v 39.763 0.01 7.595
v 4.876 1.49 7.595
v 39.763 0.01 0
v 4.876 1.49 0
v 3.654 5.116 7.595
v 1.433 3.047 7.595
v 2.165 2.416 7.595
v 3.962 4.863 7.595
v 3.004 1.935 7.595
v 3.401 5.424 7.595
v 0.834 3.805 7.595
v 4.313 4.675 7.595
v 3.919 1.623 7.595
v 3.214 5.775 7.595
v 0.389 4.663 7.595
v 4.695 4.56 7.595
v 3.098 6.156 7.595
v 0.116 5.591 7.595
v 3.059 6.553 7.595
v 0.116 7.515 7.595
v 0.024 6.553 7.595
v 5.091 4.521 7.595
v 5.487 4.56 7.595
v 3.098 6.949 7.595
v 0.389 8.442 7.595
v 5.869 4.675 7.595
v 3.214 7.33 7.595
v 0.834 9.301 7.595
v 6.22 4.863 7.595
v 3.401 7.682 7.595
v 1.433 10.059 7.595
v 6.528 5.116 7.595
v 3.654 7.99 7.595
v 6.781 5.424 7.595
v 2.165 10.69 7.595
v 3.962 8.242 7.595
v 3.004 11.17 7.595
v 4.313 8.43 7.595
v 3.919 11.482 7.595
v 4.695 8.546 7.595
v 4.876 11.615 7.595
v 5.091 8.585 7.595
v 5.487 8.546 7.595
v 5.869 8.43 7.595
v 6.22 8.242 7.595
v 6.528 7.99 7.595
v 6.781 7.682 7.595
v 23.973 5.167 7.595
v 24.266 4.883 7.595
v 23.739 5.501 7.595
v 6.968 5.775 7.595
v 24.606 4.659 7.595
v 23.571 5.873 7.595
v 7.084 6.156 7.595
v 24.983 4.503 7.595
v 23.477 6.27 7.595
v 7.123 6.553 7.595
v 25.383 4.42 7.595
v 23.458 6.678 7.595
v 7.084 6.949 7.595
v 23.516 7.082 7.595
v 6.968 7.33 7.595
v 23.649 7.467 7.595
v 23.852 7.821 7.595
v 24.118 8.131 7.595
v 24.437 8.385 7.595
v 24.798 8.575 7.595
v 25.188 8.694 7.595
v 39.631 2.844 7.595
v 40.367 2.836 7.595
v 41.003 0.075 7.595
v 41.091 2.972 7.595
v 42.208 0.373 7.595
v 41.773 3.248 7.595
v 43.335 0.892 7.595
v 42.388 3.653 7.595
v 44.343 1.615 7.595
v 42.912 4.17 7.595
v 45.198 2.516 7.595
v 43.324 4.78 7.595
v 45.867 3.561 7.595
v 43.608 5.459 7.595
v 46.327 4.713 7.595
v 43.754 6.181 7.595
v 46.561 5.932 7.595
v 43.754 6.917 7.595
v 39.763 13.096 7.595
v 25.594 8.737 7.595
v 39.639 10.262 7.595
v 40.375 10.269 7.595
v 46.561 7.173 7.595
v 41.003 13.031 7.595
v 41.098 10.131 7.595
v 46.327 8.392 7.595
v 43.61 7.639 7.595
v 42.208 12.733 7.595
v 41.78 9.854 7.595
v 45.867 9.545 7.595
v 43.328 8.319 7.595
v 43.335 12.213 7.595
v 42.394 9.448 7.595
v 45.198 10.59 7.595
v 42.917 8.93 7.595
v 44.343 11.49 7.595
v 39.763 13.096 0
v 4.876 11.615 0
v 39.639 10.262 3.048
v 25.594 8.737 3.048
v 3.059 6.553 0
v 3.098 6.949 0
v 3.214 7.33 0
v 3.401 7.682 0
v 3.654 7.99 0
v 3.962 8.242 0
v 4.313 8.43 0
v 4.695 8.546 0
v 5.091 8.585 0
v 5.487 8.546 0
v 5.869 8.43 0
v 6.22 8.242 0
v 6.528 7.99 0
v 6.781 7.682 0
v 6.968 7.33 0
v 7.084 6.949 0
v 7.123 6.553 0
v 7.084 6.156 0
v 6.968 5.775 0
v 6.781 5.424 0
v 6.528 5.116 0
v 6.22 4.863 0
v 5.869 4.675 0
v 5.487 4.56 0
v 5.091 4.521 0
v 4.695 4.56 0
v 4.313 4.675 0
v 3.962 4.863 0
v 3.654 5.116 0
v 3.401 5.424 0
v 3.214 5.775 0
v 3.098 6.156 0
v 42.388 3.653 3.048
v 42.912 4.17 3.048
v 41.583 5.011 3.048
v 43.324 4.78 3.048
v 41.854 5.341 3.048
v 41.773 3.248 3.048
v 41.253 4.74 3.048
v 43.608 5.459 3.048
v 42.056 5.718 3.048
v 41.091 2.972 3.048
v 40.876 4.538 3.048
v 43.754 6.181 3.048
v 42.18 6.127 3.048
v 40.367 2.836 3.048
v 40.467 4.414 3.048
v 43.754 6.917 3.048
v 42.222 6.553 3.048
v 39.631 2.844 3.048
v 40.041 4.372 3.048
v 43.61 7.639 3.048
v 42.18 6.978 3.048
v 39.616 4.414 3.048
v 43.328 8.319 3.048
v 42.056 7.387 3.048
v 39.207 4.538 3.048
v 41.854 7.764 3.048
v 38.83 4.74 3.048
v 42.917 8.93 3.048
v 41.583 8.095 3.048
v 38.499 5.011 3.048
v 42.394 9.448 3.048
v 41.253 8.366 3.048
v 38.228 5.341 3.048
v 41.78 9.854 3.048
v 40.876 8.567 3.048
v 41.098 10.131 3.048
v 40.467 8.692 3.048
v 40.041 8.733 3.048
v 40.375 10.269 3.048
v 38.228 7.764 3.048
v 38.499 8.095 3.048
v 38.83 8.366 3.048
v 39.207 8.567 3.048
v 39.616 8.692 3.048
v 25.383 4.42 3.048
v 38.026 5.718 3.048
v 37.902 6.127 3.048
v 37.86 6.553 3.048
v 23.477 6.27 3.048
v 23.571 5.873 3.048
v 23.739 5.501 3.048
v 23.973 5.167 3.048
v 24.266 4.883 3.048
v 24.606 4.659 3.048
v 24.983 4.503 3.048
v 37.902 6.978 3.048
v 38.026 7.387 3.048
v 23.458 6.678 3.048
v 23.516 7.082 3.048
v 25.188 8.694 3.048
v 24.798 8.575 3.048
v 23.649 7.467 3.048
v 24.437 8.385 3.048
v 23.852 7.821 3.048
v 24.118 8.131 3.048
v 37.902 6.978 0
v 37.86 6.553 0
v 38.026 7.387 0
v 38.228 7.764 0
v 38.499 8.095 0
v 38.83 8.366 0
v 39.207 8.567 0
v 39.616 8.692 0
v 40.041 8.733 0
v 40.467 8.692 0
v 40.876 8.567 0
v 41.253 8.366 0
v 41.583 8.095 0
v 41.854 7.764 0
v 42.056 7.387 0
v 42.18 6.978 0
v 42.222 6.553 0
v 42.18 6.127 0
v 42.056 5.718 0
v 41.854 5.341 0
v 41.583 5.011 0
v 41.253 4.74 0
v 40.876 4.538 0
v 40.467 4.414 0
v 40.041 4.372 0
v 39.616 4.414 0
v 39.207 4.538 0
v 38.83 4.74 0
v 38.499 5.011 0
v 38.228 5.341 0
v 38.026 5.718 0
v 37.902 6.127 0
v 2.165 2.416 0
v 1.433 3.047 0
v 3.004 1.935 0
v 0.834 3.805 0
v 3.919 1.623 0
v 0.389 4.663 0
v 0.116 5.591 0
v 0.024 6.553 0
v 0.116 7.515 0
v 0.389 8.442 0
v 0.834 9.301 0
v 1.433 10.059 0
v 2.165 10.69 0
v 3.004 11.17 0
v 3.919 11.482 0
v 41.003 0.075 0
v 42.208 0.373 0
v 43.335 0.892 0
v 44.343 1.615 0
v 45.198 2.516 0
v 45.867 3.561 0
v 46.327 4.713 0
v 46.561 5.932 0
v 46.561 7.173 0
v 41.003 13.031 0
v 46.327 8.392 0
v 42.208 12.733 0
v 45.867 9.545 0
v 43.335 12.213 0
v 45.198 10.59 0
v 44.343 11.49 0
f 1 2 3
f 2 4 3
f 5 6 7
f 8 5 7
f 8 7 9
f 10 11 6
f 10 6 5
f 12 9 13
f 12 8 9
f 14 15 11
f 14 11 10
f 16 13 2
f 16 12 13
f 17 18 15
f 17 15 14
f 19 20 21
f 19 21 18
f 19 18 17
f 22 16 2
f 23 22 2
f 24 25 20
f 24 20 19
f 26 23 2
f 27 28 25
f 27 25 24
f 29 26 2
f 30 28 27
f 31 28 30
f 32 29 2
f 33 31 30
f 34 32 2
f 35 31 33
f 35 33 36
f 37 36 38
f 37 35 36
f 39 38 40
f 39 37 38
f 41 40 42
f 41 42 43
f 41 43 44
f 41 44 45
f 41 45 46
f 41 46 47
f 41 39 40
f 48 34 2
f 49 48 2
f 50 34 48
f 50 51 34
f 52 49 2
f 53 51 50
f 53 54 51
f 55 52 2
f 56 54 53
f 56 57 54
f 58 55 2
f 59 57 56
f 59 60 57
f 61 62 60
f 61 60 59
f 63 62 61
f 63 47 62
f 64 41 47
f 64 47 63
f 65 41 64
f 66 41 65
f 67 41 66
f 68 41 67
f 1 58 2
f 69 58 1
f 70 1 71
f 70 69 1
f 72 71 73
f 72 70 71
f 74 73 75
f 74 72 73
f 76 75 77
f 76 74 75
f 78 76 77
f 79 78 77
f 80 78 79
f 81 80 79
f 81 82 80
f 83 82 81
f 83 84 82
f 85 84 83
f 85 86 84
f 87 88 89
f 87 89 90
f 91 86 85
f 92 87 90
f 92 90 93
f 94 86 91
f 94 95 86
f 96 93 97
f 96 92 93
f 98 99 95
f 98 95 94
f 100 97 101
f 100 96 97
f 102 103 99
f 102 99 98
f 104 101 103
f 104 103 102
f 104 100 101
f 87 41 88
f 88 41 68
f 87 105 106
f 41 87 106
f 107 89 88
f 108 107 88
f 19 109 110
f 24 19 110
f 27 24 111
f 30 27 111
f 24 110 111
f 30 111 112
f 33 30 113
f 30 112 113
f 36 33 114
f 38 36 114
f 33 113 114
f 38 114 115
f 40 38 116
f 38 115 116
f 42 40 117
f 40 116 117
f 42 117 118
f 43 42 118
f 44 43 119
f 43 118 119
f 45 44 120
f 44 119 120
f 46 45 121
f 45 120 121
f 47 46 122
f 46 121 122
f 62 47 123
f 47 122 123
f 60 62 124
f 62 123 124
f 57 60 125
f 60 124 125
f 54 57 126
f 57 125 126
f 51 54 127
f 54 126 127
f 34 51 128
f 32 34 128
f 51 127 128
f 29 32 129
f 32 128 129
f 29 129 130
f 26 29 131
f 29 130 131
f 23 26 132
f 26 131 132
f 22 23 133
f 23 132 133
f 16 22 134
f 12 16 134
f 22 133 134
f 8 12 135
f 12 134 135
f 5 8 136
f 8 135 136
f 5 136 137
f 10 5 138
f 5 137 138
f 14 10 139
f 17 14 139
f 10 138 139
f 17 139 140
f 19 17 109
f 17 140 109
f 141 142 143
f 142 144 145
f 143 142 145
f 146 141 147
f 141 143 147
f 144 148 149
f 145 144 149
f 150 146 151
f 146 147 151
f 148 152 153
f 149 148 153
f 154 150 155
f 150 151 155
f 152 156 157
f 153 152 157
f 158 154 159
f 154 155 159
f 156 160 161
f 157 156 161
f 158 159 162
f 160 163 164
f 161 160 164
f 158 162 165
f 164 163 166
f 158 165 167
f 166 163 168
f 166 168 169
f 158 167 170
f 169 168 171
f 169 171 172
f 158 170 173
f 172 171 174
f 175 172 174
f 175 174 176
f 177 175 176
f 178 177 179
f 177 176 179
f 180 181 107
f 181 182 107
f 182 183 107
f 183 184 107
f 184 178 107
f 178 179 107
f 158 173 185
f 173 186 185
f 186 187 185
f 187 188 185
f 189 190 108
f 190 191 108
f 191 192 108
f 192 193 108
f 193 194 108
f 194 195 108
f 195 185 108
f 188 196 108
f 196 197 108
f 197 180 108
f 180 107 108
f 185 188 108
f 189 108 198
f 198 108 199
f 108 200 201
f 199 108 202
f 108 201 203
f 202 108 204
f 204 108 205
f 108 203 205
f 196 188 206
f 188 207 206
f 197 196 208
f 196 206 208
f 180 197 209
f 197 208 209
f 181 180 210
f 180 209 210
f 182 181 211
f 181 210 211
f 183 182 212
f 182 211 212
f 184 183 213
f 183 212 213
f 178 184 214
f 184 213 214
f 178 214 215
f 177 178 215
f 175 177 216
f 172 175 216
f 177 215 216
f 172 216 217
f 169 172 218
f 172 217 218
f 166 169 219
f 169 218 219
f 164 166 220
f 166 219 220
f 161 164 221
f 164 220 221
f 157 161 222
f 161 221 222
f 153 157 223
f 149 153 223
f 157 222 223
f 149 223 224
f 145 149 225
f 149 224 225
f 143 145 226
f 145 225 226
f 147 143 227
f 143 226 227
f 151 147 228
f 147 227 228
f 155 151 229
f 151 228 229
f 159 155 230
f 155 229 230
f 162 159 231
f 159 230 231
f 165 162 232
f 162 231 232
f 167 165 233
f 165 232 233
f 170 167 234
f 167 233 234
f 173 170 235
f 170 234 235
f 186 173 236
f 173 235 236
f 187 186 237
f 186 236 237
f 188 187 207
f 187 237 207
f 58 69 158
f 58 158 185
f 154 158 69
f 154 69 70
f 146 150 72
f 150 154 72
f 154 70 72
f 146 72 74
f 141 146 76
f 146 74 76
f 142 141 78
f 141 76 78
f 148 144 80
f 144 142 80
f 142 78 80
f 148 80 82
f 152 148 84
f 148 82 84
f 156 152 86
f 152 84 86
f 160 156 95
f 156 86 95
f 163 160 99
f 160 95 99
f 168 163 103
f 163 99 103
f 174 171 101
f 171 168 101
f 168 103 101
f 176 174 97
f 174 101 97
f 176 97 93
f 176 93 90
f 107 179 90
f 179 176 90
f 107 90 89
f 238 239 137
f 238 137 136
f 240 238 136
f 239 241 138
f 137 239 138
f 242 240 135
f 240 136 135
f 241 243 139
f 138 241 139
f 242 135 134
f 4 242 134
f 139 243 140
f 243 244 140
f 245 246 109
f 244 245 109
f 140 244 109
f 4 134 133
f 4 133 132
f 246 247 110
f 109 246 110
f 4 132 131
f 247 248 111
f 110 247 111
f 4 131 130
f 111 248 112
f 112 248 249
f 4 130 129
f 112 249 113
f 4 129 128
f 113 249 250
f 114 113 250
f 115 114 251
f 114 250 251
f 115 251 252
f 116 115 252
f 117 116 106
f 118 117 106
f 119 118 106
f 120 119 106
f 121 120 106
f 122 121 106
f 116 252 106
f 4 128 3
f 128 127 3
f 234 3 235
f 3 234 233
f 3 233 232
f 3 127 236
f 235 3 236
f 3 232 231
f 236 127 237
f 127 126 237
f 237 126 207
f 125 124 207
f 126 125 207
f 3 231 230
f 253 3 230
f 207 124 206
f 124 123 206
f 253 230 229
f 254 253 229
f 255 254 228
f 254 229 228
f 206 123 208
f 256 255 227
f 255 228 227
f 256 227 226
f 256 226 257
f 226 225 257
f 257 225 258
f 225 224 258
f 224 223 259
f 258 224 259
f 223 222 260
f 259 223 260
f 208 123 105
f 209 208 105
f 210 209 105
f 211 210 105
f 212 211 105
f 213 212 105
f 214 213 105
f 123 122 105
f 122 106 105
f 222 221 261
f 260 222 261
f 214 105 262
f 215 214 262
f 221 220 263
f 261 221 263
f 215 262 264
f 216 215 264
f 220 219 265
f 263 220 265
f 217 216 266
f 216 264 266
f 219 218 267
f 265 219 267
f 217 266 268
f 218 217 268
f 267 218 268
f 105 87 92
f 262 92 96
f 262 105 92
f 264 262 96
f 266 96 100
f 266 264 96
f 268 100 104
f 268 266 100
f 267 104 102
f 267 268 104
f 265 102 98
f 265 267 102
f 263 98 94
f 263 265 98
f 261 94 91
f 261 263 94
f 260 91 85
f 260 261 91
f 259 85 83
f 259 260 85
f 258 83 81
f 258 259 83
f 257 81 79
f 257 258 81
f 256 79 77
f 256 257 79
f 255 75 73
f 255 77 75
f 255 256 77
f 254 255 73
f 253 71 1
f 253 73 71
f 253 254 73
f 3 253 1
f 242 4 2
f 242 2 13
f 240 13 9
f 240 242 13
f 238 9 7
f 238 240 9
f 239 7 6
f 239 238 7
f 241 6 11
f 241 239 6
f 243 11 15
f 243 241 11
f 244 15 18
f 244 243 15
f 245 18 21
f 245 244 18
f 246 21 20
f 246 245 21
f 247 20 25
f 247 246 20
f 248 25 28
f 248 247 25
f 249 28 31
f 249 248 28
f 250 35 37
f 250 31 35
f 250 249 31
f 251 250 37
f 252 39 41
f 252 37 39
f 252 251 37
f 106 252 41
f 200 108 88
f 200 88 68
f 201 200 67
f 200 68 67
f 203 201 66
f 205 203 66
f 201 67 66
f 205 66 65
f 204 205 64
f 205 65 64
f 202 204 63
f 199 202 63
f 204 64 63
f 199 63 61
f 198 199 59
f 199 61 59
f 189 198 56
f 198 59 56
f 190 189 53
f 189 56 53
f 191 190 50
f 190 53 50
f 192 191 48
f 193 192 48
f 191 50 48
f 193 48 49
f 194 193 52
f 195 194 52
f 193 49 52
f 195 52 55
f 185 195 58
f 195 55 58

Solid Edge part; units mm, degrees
sketch "Sketch1" plane through (0, 0, 0) normal (0, 0, -1) x (-1, 0, 0)
  circle A0 centre (-5.091, 6.5528) radius 2.032
  circle A1 centre (-40.0411, 6.5528) radius 2.1806
  line L0 (-39.7635, 13.0959) -> (-4.8761, 11.6154)
  line L1 (-4.8761, 1.4902) -> (-39.7635, 0.0097)
  arc A2 (-39.7635, 0.0097) -> (-39.7635, 13.0959) centre (-40.0411, 6.5528) cw
  arc A3 (-4.8761, 11.6154) -> (-4.8761, 1.4902) centre (-5.091, 6.5528) cw
extrude "Protrusion1" add sketch "Sketch1" against normal blind 7.5946
sketch "Sketch2" plane through (23.307, 6.5528, 7.5946) normal (0, 0, 1) x (-0.9991, -0.0424, 0)
  line L0 (-16.1522, 4.3971) -> (-1.9834, 2.2188)
  arc A0 (-2.3772, -2.0855) -> (-1.9834, 2.2188) centre (-2.3124, 0.0788) ccw
  line L1 (-16.4741, -3.0134) -> (-2.3772, -2.0855)
  arc A1 (-16.4741, -3.0134) -> (-16.1522, 4.3971) centre (-16.7191, 0.7095) cw
extrude "Enlèvement_matière_1" cut sketch "Sketch2" against normal blind 4.5466
properties part number "AC_1.08"
